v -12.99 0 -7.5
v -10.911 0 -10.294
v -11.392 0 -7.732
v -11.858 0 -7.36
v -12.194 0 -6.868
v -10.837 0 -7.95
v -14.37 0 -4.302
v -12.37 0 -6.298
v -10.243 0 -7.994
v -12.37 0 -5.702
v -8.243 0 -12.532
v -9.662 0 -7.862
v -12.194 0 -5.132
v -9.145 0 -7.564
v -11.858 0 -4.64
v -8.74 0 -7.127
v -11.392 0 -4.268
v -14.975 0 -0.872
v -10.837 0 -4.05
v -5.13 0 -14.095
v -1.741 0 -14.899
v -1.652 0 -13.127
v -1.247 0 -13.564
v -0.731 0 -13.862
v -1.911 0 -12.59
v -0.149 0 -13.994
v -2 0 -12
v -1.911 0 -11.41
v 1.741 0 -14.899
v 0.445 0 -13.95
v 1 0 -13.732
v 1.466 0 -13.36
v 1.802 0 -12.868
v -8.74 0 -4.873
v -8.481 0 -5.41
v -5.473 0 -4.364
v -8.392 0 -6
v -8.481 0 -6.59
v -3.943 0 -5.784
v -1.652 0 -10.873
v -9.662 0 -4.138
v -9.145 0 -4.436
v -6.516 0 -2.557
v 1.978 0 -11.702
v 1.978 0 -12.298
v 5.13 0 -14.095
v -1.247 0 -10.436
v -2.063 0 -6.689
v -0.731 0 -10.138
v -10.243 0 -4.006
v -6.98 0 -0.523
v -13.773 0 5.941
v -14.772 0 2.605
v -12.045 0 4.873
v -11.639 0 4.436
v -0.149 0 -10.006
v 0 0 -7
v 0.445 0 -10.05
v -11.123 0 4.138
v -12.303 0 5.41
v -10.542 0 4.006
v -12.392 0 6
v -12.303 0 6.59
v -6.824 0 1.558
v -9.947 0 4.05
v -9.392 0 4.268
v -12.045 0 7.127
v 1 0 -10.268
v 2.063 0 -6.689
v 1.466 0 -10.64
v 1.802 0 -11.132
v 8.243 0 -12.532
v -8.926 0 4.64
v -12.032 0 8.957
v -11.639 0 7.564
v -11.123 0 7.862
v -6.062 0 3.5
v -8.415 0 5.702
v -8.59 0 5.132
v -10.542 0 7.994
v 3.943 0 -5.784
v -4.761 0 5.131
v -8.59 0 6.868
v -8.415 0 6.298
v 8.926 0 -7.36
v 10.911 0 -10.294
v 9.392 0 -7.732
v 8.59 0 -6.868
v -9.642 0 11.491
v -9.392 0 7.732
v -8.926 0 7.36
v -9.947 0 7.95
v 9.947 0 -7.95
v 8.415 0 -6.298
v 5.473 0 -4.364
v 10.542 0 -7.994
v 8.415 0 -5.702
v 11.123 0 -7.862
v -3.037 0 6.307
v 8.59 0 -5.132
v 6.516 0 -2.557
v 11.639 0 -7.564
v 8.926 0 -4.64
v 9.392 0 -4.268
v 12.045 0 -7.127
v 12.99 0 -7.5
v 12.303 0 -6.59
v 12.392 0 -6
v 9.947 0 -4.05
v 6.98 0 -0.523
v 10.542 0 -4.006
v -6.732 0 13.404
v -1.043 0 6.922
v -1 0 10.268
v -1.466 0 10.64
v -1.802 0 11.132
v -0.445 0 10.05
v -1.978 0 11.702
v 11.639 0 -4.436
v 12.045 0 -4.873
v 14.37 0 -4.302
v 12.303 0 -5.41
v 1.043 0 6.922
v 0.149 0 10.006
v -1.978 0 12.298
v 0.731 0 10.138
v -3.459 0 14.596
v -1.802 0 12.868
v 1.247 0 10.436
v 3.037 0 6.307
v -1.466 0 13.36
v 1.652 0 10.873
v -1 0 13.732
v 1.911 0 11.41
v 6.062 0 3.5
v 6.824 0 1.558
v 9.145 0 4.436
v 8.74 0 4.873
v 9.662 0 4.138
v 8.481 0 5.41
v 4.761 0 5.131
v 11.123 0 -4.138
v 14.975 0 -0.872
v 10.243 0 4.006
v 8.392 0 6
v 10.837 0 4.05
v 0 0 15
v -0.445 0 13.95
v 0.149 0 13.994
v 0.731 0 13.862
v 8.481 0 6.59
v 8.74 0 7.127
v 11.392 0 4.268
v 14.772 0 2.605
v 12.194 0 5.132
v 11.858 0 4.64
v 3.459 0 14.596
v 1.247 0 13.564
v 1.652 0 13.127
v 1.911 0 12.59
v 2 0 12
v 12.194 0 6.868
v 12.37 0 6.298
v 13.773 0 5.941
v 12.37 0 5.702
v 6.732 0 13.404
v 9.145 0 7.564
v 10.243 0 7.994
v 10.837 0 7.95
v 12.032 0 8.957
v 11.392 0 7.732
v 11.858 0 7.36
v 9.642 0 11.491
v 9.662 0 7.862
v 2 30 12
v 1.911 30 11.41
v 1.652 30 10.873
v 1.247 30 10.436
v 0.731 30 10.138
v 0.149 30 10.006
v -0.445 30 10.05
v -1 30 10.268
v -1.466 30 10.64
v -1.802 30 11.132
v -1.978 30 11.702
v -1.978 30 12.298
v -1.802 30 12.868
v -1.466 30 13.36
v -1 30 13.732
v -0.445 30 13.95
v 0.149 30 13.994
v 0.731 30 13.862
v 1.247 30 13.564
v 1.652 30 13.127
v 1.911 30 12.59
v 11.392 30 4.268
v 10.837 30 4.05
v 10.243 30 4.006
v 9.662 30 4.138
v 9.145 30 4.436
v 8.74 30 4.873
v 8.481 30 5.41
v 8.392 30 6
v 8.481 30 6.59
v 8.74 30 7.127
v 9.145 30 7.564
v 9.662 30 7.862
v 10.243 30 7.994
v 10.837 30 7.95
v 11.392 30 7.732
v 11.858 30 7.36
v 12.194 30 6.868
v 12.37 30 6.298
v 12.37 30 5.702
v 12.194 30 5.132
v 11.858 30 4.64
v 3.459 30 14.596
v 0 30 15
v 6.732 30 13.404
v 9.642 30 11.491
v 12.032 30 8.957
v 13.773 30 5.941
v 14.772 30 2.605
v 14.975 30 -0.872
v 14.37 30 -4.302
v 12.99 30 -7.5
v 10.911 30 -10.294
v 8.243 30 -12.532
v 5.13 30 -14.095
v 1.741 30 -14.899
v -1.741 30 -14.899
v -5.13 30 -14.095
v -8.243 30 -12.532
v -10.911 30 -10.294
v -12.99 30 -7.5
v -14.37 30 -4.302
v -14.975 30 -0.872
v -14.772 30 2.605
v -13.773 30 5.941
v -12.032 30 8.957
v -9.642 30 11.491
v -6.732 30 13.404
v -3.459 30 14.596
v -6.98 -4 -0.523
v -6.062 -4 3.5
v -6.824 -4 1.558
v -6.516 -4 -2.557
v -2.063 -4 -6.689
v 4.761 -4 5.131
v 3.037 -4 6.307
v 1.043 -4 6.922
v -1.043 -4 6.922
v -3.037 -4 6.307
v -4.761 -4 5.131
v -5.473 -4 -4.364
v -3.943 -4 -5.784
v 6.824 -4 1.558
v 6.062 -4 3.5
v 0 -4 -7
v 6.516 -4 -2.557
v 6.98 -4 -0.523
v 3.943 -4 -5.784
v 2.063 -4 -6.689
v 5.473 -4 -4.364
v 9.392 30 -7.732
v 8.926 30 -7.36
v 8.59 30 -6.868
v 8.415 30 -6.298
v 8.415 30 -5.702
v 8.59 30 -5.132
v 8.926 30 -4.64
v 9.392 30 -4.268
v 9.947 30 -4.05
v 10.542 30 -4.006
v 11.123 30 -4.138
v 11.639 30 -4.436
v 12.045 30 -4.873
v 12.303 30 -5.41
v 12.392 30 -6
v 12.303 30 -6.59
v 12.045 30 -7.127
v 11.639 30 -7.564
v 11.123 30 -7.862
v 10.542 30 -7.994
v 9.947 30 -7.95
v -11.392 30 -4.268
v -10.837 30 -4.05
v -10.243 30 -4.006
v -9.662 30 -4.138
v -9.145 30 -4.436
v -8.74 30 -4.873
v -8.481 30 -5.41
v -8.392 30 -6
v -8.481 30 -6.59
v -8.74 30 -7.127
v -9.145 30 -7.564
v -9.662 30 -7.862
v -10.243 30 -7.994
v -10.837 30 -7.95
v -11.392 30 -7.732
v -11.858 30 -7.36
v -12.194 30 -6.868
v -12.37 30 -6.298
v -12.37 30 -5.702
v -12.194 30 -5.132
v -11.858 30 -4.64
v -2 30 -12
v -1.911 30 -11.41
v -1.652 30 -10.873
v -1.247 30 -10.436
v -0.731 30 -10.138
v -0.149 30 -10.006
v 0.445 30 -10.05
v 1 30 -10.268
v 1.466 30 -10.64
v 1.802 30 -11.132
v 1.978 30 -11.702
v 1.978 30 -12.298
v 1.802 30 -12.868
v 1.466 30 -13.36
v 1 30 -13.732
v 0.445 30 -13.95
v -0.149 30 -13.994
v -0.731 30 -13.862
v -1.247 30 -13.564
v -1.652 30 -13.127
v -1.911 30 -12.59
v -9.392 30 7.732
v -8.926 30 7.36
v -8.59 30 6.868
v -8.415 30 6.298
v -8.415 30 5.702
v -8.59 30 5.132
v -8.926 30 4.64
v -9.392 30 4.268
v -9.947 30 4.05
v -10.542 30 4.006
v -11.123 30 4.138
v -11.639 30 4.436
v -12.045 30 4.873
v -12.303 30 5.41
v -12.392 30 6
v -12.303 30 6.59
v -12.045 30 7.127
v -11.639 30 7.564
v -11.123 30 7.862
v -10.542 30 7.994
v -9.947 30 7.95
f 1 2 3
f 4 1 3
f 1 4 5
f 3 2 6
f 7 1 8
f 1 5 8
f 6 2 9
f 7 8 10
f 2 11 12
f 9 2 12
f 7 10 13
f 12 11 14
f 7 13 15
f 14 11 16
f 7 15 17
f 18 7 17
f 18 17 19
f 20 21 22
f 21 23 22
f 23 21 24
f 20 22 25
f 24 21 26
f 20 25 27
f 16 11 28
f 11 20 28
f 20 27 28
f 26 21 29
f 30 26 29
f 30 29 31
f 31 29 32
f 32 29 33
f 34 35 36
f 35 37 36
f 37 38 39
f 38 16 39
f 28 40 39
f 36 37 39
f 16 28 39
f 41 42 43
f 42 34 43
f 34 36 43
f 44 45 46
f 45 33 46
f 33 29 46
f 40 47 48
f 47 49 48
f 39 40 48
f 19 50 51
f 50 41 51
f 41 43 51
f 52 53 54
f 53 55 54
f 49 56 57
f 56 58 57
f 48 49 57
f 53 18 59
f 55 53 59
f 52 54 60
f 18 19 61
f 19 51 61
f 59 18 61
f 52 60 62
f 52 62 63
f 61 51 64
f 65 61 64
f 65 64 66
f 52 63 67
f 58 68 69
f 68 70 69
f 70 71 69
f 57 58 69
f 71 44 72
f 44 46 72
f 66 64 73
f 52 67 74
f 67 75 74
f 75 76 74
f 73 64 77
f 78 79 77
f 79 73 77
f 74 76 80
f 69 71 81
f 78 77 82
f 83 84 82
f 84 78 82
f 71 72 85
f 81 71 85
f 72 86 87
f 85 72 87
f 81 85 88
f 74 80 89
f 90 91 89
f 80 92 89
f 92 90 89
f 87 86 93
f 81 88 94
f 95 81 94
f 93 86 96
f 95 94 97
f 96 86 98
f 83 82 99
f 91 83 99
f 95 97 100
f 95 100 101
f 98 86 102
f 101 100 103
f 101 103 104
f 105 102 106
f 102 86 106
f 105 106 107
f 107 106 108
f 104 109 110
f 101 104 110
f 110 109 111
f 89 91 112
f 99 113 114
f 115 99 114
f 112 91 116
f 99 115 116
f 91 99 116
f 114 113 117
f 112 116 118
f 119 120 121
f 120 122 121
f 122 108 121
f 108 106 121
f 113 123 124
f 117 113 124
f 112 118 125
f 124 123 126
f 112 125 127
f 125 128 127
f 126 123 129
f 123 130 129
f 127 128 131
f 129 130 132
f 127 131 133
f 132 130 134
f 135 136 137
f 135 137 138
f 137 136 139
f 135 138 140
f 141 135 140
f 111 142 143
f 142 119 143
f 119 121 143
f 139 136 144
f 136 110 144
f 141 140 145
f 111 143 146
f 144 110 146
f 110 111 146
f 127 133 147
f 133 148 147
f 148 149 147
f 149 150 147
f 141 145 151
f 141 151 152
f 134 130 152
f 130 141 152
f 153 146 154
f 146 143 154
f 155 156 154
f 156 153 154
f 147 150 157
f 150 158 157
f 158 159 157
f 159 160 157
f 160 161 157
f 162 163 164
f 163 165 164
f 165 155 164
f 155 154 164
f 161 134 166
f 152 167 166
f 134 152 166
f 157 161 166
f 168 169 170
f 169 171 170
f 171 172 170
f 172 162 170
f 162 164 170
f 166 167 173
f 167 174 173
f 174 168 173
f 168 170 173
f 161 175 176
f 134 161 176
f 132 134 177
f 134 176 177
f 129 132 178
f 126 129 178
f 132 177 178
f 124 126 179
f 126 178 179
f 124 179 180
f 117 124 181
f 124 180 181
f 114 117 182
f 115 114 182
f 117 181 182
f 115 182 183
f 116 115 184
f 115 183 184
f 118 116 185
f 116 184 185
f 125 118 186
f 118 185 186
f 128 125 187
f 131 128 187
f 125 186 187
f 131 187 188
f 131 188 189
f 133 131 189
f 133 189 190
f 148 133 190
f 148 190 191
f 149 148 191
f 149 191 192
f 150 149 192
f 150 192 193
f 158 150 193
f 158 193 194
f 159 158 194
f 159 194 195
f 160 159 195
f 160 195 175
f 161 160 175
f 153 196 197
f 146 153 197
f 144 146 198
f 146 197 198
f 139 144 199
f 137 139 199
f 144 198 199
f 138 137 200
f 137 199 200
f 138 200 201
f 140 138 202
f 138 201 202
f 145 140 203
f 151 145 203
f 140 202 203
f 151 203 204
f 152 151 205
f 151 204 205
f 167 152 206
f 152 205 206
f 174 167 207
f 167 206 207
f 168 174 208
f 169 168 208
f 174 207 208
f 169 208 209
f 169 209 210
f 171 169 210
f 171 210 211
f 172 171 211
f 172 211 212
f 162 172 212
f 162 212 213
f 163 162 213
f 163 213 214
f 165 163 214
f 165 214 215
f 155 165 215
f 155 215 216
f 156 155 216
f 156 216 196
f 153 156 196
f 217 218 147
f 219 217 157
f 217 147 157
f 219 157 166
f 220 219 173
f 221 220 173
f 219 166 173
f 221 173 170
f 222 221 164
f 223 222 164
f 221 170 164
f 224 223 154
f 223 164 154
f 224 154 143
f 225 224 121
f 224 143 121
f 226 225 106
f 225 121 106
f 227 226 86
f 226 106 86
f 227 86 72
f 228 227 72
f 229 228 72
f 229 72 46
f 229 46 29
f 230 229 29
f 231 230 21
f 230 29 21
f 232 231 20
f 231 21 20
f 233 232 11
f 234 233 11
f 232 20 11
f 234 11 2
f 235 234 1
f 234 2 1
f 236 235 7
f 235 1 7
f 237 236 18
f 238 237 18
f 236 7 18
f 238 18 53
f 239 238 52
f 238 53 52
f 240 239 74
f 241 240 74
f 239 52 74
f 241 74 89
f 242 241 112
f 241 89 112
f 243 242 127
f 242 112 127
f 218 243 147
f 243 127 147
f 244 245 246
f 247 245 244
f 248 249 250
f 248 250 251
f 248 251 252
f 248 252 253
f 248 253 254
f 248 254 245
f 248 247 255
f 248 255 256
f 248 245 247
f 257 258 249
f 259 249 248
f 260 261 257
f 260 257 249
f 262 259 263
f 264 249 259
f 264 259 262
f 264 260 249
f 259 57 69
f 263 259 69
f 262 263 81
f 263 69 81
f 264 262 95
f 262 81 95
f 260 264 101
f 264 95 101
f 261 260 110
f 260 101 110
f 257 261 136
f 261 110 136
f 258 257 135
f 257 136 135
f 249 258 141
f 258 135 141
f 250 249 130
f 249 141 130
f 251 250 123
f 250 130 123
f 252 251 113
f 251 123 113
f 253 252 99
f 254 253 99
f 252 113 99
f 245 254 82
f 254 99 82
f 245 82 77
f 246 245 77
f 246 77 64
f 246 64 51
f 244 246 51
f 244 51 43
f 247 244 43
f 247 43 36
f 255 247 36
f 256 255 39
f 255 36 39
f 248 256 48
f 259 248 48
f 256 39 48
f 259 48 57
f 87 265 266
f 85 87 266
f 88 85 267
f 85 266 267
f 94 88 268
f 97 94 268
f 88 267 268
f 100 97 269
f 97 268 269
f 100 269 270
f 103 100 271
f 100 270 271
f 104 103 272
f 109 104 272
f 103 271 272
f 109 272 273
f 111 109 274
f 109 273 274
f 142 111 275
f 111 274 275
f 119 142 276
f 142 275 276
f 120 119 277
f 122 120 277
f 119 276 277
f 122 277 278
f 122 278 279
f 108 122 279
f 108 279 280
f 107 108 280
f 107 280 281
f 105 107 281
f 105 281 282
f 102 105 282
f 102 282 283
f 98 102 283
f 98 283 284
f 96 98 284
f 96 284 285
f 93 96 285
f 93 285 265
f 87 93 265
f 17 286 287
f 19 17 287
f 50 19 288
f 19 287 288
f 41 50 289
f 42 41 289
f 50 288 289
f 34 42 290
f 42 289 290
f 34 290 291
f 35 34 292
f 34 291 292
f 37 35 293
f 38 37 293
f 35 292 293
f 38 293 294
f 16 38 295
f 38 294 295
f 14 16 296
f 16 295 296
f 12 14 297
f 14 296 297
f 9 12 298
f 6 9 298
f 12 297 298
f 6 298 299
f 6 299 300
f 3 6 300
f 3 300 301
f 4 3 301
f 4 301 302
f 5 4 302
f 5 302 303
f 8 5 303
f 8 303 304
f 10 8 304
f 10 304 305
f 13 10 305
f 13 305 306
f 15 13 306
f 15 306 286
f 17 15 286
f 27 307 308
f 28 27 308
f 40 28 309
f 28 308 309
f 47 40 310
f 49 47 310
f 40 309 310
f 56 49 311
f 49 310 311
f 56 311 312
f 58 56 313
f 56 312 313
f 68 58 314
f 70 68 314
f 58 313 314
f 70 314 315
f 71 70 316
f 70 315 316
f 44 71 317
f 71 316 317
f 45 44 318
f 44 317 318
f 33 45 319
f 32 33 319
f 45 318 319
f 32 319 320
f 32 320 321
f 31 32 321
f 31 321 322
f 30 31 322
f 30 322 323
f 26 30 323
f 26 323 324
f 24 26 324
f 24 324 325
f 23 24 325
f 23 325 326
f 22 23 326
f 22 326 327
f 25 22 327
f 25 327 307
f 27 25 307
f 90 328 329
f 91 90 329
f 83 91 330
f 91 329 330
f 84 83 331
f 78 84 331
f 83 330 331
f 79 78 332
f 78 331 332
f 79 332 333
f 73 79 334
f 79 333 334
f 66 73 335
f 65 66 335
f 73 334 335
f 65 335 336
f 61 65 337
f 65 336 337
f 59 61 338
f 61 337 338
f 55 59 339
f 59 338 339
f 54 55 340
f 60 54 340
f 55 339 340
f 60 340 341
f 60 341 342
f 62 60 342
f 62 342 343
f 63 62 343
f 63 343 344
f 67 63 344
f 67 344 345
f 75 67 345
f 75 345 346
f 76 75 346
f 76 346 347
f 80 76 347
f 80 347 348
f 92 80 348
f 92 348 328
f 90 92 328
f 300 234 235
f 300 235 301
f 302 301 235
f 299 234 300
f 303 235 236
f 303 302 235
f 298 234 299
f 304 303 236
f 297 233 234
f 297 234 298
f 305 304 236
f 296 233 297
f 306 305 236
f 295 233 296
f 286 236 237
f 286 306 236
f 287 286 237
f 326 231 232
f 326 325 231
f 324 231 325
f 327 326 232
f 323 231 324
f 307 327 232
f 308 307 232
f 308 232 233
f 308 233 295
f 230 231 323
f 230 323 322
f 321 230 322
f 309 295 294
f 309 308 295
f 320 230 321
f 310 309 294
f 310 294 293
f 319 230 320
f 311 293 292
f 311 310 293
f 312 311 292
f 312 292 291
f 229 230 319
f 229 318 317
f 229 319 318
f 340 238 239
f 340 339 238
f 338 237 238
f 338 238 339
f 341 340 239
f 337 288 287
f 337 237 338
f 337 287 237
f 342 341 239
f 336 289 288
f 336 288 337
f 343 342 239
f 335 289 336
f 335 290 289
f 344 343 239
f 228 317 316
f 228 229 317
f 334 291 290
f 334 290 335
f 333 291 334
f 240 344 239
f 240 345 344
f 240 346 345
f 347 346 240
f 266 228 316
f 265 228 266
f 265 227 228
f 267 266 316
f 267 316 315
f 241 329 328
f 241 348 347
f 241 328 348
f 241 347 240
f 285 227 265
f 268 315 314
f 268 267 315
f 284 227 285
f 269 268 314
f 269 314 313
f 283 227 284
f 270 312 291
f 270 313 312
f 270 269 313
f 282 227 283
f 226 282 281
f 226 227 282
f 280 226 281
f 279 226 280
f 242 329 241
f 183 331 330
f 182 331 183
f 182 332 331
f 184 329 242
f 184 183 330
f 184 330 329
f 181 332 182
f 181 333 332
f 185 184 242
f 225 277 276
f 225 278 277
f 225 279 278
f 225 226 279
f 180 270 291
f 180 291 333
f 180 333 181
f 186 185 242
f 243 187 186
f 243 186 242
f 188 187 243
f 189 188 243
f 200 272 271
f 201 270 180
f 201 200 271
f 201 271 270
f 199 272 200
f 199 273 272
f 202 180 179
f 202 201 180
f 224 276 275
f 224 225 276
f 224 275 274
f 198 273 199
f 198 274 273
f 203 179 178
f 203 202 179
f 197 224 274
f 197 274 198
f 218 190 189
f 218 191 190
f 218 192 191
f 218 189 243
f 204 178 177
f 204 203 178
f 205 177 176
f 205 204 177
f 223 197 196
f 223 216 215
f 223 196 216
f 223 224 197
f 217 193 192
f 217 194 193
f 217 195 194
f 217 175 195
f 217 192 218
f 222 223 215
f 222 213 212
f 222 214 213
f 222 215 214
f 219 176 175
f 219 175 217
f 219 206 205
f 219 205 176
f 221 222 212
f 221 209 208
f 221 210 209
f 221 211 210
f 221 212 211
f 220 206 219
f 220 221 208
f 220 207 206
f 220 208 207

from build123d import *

# Parameters (mm, degrees)
SKETCH1_R             = 15
BOSS_EXTRUDE1_DEPTH   = 30
SKETCH2_R             = 7
BOSS_EXTRUDE2_DEPTH   = 4
F_4_0MM_DOWEL_HOLE1_D = 4
CIRPATTERN1_COUNT     = 6


with BuildPart() as part:
    # Sketch1 → Boss-Extrude1 (new body)
    with BuildSketch(Plane(origin=(0, 0, 0), x_dir=(1, 0, 0), z_dir=(0, 1, 0))):
        Circle(SKETCH1_R)
    extrude(amount=BOSS_EXTRUDE1_DEPTH)

    # Sketch2 → Boss-Extrude2 (add)
    with BuildSketch(Plane.XZ):
        Circle(SKETCH2_R)
    extrude(amount=BOSS_EXTRUDE2_DEPTH)

    # Ø4.0mm Dowel Hole1 (through all)
    with Locations(Plane(origin=(0, 0, 0), x_dir=(-1, 0, 0), z_dir=(0, -1, 0))):
        with Locations((0, -12)):
            f_4_0mm_dowel_hole1 = Hole(F_4_0MM_DOWEL_HOLE1_D / 2)

    # CirPattern1: Ø4.0mm Dowel Hole1 ×6 about axis
    cirpattern1_axis = Axis((0, 30, 0), (0, -1, 0))
    for i in range(1, CIRPATTERN1_COUNT):
        add(f_4_0mm_dowel_hole1.rotate(cirpattern1_axis, i * 360 / CIRPATTERN1_COUNT), mode=Mode.SUBTRACT)


solid = part.part
